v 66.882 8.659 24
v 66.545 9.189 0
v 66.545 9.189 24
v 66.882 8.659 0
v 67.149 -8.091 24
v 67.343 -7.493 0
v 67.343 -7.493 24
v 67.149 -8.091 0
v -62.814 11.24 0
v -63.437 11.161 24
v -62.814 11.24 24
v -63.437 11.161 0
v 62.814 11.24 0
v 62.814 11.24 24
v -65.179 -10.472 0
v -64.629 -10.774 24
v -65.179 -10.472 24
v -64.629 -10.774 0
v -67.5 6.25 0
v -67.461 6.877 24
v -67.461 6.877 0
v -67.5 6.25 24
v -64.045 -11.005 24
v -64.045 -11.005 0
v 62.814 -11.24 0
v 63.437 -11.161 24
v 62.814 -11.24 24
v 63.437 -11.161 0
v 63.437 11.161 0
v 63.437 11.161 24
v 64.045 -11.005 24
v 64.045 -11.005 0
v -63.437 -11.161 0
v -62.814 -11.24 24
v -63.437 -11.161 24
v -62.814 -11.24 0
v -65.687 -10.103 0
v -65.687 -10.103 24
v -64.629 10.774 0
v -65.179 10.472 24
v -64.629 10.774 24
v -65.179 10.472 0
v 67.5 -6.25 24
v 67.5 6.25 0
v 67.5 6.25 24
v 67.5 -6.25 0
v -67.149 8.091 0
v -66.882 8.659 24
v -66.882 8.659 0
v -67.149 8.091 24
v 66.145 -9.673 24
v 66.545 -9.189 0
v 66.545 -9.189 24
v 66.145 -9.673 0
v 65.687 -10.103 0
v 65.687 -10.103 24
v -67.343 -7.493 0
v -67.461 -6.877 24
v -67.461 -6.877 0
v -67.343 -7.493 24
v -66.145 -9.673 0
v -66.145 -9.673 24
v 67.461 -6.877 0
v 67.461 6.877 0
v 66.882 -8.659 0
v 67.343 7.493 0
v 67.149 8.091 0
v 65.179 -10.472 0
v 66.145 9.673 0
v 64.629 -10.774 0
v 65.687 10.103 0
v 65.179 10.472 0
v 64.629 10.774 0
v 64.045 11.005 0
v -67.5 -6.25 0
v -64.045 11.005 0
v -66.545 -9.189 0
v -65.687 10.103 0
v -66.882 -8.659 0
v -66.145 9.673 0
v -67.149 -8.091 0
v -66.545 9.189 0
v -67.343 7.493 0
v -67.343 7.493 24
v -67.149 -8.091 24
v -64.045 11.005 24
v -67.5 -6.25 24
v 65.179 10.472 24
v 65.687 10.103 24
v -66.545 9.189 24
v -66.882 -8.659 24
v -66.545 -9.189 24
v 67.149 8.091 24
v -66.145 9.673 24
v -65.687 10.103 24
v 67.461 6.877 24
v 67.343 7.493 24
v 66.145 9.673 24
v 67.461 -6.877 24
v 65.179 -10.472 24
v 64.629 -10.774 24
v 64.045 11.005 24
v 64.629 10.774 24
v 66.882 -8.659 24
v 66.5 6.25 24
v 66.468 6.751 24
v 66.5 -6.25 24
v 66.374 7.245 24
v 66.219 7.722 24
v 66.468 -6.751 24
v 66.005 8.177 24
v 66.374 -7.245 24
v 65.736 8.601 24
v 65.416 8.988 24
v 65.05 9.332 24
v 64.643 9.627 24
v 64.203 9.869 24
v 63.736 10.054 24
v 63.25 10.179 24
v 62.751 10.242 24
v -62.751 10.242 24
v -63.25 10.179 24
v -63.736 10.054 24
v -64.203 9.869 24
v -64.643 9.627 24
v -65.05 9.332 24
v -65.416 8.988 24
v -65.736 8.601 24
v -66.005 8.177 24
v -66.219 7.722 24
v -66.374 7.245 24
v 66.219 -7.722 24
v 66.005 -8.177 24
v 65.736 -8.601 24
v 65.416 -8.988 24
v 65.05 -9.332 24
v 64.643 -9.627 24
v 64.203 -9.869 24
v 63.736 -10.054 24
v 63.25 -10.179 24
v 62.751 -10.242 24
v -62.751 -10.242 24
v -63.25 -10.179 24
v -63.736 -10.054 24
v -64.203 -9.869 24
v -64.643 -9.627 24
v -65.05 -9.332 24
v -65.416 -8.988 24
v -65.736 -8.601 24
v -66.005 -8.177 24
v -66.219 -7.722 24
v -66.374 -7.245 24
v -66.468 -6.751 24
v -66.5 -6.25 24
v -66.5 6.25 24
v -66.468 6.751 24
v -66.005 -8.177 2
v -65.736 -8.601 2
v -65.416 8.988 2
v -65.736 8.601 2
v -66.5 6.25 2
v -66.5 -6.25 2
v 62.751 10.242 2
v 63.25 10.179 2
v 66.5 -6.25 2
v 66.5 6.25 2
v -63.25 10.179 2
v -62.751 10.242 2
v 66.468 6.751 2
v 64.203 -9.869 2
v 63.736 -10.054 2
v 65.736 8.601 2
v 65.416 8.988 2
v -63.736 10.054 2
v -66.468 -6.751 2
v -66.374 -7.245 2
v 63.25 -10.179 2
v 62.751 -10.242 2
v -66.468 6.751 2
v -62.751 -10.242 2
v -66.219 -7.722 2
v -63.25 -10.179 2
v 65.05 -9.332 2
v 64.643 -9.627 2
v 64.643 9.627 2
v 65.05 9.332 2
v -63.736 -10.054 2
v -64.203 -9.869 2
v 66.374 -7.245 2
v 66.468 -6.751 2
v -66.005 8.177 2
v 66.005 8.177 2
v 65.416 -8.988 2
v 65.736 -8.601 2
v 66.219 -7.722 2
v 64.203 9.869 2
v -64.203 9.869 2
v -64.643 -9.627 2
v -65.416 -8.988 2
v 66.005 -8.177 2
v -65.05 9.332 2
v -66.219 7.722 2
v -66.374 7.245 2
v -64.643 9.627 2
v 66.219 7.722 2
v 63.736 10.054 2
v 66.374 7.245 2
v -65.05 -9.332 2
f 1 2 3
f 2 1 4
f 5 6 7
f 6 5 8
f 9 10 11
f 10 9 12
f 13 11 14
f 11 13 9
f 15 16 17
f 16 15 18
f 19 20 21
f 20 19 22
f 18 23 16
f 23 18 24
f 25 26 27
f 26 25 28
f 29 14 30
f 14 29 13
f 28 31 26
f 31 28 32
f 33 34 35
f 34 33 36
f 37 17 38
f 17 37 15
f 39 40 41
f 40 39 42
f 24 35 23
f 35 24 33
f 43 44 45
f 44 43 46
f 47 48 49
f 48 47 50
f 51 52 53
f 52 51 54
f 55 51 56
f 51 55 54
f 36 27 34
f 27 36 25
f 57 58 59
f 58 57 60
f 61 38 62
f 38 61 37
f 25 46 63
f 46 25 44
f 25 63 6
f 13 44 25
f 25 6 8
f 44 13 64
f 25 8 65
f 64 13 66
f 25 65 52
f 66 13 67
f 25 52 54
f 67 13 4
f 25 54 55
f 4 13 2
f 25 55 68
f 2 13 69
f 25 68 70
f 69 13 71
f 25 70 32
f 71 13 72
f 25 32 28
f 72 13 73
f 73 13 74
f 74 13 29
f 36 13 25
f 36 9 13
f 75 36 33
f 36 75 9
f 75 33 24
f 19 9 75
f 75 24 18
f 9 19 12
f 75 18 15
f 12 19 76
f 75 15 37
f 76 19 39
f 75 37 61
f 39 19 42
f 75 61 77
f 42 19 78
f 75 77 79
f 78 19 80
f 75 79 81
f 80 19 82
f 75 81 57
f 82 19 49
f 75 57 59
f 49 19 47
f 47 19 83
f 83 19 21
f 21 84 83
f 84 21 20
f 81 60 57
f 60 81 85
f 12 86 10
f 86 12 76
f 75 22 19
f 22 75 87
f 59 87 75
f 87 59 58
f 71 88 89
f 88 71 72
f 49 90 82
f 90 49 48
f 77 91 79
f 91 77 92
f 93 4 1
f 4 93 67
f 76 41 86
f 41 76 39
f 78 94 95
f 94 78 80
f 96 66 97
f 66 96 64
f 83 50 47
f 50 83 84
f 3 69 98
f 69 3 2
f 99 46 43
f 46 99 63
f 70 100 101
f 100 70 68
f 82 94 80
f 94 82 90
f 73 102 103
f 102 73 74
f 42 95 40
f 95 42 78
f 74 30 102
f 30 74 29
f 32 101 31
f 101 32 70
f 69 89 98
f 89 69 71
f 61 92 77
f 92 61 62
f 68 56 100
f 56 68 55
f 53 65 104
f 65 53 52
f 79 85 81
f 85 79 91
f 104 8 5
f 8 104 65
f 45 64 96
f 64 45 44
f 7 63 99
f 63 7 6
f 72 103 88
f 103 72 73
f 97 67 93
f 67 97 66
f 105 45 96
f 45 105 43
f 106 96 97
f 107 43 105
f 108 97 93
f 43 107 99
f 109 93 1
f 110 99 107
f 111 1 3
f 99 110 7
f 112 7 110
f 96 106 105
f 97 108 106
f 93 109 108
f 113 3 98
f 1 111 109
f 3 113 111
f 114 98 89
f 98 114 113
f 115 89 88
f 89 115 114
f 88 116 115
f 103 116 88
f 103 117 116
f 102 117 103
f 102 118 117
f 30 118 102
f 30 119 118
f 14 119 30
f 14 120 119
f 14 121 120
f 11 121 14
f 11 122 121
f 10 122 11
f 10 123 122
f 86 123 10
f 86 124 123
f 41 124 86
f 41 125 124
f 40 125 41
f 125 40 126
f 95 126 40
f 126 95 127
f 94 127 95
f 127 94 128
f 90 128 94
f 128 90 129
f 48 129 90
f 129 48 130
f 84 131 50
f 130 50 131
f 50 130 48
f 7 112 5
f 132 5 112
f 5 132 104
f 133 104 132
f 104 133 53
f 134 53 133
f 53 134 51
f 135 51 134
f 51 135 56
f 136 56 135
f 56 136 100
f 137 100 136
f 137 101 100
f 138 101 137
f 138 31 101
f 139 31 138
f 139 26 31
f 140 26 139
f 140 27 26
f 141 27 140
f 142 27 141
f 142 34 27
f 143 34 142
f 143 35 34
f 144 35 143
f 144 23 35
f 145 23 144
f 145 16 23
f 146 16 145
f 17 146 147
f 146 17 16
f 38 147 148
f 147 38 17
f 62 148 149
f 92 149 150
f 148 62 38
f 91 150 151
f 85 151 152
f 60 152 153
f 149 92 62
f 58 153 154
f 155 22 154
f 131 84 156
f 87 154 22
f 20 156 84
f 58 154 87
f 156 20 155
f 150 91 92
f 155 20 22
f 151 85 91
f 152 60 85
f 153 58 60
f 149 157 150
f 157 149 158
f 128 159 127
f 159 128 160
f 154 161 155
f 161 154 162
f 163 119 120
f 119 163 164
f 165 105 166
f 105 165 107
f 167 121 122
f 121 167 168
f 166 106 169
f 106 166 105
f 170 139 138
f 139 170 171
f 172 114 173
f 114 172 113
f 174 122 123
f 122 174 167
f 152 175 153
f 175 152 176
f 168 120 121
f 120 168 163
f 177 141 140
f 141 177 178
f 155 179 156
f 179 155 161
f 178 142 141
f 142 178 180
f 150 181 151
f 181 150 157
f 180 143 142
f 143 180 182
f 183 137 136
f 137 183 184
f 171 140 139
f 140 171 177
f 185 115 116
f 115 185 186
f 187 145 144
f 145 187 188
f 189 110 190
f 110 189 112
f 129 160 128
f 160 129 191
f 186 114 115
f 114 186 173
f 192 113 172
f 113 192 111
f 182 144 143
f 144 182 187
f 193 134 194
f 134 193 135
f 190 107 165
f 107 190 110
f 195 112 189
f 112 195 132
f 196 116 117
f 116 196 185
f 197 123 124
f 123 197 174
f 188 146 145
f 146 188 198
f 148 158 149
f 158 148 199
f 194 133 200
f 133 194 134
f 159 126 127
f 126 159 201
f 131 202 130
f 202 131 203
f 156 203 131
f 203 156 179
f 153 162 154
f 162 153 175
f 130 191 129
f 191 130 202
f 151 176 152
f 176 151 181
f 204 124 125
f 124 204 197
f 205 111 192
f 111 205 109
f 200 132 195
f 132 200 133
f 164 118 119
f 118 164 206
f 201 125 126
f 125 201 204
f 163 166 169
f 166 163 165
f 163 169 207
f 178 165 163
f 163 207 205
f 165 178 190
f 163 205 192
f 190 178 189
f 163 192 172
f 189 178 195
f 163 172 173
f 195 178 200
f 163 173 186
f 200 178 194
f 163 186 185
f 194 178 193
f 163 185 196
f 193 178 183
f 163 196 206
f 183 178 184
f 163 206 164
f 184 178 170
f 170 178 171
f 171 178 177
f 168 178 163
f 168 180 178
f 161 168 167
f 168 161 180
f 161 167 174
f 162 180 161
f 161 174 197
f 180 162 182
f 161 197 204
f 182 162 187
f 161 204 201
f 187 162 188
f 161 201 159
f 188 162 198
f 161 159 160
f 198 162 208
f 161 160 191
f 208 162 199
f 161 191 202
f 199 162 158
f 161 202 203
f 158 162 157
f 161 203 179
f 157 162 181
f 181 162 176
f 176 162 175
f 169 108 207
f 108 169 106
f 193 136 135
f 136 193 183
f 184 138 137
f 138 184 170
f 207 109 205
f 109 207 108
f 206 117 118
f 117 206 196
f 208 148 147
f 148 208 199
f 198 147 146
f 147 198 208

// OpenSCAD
$fn = 50;


difference() {
	union() {
		hull() {
			translate(v = [-62.5000000000, 6.2500000000, 0]) {
				cylinder(h = 24, r = 5);
			}
			translate(v = [62.5000000000, 6.2500000000, 0]) {
				cylinder(h = 24, r = 5);
			}
			translate(v = [-62.5000000000, -6.2500000000, 0]) {
				cylinder(h = 24, r = 5);
			}
			translate(v = [62.5000000000, -6.2500000000, 0]) {
				cylinder(h = 24, r = 5);
			}
		}
	}
	union() {
		translate(v = [0, 0, 2]) {
			hull() {
				translate(v = [-62.5000000000, 6.2500000000, 0]) {
					cylinder(h = 22, r = 4);
				}
				translate(v = [62.5000000000, 6.2500000000, 0]) {
					cylinder(h = 22, r = 4);
				}
				translate(v = [-62.5000000000, -6.2500000000, 0]) {
					cylinder(h = 22, r = 4);
				}
				translate(v = [62.5000000000, -6.2500000000, 0]) {
					cylinder(h = 22, r = 4);
				}
			}
		}
	}
}
